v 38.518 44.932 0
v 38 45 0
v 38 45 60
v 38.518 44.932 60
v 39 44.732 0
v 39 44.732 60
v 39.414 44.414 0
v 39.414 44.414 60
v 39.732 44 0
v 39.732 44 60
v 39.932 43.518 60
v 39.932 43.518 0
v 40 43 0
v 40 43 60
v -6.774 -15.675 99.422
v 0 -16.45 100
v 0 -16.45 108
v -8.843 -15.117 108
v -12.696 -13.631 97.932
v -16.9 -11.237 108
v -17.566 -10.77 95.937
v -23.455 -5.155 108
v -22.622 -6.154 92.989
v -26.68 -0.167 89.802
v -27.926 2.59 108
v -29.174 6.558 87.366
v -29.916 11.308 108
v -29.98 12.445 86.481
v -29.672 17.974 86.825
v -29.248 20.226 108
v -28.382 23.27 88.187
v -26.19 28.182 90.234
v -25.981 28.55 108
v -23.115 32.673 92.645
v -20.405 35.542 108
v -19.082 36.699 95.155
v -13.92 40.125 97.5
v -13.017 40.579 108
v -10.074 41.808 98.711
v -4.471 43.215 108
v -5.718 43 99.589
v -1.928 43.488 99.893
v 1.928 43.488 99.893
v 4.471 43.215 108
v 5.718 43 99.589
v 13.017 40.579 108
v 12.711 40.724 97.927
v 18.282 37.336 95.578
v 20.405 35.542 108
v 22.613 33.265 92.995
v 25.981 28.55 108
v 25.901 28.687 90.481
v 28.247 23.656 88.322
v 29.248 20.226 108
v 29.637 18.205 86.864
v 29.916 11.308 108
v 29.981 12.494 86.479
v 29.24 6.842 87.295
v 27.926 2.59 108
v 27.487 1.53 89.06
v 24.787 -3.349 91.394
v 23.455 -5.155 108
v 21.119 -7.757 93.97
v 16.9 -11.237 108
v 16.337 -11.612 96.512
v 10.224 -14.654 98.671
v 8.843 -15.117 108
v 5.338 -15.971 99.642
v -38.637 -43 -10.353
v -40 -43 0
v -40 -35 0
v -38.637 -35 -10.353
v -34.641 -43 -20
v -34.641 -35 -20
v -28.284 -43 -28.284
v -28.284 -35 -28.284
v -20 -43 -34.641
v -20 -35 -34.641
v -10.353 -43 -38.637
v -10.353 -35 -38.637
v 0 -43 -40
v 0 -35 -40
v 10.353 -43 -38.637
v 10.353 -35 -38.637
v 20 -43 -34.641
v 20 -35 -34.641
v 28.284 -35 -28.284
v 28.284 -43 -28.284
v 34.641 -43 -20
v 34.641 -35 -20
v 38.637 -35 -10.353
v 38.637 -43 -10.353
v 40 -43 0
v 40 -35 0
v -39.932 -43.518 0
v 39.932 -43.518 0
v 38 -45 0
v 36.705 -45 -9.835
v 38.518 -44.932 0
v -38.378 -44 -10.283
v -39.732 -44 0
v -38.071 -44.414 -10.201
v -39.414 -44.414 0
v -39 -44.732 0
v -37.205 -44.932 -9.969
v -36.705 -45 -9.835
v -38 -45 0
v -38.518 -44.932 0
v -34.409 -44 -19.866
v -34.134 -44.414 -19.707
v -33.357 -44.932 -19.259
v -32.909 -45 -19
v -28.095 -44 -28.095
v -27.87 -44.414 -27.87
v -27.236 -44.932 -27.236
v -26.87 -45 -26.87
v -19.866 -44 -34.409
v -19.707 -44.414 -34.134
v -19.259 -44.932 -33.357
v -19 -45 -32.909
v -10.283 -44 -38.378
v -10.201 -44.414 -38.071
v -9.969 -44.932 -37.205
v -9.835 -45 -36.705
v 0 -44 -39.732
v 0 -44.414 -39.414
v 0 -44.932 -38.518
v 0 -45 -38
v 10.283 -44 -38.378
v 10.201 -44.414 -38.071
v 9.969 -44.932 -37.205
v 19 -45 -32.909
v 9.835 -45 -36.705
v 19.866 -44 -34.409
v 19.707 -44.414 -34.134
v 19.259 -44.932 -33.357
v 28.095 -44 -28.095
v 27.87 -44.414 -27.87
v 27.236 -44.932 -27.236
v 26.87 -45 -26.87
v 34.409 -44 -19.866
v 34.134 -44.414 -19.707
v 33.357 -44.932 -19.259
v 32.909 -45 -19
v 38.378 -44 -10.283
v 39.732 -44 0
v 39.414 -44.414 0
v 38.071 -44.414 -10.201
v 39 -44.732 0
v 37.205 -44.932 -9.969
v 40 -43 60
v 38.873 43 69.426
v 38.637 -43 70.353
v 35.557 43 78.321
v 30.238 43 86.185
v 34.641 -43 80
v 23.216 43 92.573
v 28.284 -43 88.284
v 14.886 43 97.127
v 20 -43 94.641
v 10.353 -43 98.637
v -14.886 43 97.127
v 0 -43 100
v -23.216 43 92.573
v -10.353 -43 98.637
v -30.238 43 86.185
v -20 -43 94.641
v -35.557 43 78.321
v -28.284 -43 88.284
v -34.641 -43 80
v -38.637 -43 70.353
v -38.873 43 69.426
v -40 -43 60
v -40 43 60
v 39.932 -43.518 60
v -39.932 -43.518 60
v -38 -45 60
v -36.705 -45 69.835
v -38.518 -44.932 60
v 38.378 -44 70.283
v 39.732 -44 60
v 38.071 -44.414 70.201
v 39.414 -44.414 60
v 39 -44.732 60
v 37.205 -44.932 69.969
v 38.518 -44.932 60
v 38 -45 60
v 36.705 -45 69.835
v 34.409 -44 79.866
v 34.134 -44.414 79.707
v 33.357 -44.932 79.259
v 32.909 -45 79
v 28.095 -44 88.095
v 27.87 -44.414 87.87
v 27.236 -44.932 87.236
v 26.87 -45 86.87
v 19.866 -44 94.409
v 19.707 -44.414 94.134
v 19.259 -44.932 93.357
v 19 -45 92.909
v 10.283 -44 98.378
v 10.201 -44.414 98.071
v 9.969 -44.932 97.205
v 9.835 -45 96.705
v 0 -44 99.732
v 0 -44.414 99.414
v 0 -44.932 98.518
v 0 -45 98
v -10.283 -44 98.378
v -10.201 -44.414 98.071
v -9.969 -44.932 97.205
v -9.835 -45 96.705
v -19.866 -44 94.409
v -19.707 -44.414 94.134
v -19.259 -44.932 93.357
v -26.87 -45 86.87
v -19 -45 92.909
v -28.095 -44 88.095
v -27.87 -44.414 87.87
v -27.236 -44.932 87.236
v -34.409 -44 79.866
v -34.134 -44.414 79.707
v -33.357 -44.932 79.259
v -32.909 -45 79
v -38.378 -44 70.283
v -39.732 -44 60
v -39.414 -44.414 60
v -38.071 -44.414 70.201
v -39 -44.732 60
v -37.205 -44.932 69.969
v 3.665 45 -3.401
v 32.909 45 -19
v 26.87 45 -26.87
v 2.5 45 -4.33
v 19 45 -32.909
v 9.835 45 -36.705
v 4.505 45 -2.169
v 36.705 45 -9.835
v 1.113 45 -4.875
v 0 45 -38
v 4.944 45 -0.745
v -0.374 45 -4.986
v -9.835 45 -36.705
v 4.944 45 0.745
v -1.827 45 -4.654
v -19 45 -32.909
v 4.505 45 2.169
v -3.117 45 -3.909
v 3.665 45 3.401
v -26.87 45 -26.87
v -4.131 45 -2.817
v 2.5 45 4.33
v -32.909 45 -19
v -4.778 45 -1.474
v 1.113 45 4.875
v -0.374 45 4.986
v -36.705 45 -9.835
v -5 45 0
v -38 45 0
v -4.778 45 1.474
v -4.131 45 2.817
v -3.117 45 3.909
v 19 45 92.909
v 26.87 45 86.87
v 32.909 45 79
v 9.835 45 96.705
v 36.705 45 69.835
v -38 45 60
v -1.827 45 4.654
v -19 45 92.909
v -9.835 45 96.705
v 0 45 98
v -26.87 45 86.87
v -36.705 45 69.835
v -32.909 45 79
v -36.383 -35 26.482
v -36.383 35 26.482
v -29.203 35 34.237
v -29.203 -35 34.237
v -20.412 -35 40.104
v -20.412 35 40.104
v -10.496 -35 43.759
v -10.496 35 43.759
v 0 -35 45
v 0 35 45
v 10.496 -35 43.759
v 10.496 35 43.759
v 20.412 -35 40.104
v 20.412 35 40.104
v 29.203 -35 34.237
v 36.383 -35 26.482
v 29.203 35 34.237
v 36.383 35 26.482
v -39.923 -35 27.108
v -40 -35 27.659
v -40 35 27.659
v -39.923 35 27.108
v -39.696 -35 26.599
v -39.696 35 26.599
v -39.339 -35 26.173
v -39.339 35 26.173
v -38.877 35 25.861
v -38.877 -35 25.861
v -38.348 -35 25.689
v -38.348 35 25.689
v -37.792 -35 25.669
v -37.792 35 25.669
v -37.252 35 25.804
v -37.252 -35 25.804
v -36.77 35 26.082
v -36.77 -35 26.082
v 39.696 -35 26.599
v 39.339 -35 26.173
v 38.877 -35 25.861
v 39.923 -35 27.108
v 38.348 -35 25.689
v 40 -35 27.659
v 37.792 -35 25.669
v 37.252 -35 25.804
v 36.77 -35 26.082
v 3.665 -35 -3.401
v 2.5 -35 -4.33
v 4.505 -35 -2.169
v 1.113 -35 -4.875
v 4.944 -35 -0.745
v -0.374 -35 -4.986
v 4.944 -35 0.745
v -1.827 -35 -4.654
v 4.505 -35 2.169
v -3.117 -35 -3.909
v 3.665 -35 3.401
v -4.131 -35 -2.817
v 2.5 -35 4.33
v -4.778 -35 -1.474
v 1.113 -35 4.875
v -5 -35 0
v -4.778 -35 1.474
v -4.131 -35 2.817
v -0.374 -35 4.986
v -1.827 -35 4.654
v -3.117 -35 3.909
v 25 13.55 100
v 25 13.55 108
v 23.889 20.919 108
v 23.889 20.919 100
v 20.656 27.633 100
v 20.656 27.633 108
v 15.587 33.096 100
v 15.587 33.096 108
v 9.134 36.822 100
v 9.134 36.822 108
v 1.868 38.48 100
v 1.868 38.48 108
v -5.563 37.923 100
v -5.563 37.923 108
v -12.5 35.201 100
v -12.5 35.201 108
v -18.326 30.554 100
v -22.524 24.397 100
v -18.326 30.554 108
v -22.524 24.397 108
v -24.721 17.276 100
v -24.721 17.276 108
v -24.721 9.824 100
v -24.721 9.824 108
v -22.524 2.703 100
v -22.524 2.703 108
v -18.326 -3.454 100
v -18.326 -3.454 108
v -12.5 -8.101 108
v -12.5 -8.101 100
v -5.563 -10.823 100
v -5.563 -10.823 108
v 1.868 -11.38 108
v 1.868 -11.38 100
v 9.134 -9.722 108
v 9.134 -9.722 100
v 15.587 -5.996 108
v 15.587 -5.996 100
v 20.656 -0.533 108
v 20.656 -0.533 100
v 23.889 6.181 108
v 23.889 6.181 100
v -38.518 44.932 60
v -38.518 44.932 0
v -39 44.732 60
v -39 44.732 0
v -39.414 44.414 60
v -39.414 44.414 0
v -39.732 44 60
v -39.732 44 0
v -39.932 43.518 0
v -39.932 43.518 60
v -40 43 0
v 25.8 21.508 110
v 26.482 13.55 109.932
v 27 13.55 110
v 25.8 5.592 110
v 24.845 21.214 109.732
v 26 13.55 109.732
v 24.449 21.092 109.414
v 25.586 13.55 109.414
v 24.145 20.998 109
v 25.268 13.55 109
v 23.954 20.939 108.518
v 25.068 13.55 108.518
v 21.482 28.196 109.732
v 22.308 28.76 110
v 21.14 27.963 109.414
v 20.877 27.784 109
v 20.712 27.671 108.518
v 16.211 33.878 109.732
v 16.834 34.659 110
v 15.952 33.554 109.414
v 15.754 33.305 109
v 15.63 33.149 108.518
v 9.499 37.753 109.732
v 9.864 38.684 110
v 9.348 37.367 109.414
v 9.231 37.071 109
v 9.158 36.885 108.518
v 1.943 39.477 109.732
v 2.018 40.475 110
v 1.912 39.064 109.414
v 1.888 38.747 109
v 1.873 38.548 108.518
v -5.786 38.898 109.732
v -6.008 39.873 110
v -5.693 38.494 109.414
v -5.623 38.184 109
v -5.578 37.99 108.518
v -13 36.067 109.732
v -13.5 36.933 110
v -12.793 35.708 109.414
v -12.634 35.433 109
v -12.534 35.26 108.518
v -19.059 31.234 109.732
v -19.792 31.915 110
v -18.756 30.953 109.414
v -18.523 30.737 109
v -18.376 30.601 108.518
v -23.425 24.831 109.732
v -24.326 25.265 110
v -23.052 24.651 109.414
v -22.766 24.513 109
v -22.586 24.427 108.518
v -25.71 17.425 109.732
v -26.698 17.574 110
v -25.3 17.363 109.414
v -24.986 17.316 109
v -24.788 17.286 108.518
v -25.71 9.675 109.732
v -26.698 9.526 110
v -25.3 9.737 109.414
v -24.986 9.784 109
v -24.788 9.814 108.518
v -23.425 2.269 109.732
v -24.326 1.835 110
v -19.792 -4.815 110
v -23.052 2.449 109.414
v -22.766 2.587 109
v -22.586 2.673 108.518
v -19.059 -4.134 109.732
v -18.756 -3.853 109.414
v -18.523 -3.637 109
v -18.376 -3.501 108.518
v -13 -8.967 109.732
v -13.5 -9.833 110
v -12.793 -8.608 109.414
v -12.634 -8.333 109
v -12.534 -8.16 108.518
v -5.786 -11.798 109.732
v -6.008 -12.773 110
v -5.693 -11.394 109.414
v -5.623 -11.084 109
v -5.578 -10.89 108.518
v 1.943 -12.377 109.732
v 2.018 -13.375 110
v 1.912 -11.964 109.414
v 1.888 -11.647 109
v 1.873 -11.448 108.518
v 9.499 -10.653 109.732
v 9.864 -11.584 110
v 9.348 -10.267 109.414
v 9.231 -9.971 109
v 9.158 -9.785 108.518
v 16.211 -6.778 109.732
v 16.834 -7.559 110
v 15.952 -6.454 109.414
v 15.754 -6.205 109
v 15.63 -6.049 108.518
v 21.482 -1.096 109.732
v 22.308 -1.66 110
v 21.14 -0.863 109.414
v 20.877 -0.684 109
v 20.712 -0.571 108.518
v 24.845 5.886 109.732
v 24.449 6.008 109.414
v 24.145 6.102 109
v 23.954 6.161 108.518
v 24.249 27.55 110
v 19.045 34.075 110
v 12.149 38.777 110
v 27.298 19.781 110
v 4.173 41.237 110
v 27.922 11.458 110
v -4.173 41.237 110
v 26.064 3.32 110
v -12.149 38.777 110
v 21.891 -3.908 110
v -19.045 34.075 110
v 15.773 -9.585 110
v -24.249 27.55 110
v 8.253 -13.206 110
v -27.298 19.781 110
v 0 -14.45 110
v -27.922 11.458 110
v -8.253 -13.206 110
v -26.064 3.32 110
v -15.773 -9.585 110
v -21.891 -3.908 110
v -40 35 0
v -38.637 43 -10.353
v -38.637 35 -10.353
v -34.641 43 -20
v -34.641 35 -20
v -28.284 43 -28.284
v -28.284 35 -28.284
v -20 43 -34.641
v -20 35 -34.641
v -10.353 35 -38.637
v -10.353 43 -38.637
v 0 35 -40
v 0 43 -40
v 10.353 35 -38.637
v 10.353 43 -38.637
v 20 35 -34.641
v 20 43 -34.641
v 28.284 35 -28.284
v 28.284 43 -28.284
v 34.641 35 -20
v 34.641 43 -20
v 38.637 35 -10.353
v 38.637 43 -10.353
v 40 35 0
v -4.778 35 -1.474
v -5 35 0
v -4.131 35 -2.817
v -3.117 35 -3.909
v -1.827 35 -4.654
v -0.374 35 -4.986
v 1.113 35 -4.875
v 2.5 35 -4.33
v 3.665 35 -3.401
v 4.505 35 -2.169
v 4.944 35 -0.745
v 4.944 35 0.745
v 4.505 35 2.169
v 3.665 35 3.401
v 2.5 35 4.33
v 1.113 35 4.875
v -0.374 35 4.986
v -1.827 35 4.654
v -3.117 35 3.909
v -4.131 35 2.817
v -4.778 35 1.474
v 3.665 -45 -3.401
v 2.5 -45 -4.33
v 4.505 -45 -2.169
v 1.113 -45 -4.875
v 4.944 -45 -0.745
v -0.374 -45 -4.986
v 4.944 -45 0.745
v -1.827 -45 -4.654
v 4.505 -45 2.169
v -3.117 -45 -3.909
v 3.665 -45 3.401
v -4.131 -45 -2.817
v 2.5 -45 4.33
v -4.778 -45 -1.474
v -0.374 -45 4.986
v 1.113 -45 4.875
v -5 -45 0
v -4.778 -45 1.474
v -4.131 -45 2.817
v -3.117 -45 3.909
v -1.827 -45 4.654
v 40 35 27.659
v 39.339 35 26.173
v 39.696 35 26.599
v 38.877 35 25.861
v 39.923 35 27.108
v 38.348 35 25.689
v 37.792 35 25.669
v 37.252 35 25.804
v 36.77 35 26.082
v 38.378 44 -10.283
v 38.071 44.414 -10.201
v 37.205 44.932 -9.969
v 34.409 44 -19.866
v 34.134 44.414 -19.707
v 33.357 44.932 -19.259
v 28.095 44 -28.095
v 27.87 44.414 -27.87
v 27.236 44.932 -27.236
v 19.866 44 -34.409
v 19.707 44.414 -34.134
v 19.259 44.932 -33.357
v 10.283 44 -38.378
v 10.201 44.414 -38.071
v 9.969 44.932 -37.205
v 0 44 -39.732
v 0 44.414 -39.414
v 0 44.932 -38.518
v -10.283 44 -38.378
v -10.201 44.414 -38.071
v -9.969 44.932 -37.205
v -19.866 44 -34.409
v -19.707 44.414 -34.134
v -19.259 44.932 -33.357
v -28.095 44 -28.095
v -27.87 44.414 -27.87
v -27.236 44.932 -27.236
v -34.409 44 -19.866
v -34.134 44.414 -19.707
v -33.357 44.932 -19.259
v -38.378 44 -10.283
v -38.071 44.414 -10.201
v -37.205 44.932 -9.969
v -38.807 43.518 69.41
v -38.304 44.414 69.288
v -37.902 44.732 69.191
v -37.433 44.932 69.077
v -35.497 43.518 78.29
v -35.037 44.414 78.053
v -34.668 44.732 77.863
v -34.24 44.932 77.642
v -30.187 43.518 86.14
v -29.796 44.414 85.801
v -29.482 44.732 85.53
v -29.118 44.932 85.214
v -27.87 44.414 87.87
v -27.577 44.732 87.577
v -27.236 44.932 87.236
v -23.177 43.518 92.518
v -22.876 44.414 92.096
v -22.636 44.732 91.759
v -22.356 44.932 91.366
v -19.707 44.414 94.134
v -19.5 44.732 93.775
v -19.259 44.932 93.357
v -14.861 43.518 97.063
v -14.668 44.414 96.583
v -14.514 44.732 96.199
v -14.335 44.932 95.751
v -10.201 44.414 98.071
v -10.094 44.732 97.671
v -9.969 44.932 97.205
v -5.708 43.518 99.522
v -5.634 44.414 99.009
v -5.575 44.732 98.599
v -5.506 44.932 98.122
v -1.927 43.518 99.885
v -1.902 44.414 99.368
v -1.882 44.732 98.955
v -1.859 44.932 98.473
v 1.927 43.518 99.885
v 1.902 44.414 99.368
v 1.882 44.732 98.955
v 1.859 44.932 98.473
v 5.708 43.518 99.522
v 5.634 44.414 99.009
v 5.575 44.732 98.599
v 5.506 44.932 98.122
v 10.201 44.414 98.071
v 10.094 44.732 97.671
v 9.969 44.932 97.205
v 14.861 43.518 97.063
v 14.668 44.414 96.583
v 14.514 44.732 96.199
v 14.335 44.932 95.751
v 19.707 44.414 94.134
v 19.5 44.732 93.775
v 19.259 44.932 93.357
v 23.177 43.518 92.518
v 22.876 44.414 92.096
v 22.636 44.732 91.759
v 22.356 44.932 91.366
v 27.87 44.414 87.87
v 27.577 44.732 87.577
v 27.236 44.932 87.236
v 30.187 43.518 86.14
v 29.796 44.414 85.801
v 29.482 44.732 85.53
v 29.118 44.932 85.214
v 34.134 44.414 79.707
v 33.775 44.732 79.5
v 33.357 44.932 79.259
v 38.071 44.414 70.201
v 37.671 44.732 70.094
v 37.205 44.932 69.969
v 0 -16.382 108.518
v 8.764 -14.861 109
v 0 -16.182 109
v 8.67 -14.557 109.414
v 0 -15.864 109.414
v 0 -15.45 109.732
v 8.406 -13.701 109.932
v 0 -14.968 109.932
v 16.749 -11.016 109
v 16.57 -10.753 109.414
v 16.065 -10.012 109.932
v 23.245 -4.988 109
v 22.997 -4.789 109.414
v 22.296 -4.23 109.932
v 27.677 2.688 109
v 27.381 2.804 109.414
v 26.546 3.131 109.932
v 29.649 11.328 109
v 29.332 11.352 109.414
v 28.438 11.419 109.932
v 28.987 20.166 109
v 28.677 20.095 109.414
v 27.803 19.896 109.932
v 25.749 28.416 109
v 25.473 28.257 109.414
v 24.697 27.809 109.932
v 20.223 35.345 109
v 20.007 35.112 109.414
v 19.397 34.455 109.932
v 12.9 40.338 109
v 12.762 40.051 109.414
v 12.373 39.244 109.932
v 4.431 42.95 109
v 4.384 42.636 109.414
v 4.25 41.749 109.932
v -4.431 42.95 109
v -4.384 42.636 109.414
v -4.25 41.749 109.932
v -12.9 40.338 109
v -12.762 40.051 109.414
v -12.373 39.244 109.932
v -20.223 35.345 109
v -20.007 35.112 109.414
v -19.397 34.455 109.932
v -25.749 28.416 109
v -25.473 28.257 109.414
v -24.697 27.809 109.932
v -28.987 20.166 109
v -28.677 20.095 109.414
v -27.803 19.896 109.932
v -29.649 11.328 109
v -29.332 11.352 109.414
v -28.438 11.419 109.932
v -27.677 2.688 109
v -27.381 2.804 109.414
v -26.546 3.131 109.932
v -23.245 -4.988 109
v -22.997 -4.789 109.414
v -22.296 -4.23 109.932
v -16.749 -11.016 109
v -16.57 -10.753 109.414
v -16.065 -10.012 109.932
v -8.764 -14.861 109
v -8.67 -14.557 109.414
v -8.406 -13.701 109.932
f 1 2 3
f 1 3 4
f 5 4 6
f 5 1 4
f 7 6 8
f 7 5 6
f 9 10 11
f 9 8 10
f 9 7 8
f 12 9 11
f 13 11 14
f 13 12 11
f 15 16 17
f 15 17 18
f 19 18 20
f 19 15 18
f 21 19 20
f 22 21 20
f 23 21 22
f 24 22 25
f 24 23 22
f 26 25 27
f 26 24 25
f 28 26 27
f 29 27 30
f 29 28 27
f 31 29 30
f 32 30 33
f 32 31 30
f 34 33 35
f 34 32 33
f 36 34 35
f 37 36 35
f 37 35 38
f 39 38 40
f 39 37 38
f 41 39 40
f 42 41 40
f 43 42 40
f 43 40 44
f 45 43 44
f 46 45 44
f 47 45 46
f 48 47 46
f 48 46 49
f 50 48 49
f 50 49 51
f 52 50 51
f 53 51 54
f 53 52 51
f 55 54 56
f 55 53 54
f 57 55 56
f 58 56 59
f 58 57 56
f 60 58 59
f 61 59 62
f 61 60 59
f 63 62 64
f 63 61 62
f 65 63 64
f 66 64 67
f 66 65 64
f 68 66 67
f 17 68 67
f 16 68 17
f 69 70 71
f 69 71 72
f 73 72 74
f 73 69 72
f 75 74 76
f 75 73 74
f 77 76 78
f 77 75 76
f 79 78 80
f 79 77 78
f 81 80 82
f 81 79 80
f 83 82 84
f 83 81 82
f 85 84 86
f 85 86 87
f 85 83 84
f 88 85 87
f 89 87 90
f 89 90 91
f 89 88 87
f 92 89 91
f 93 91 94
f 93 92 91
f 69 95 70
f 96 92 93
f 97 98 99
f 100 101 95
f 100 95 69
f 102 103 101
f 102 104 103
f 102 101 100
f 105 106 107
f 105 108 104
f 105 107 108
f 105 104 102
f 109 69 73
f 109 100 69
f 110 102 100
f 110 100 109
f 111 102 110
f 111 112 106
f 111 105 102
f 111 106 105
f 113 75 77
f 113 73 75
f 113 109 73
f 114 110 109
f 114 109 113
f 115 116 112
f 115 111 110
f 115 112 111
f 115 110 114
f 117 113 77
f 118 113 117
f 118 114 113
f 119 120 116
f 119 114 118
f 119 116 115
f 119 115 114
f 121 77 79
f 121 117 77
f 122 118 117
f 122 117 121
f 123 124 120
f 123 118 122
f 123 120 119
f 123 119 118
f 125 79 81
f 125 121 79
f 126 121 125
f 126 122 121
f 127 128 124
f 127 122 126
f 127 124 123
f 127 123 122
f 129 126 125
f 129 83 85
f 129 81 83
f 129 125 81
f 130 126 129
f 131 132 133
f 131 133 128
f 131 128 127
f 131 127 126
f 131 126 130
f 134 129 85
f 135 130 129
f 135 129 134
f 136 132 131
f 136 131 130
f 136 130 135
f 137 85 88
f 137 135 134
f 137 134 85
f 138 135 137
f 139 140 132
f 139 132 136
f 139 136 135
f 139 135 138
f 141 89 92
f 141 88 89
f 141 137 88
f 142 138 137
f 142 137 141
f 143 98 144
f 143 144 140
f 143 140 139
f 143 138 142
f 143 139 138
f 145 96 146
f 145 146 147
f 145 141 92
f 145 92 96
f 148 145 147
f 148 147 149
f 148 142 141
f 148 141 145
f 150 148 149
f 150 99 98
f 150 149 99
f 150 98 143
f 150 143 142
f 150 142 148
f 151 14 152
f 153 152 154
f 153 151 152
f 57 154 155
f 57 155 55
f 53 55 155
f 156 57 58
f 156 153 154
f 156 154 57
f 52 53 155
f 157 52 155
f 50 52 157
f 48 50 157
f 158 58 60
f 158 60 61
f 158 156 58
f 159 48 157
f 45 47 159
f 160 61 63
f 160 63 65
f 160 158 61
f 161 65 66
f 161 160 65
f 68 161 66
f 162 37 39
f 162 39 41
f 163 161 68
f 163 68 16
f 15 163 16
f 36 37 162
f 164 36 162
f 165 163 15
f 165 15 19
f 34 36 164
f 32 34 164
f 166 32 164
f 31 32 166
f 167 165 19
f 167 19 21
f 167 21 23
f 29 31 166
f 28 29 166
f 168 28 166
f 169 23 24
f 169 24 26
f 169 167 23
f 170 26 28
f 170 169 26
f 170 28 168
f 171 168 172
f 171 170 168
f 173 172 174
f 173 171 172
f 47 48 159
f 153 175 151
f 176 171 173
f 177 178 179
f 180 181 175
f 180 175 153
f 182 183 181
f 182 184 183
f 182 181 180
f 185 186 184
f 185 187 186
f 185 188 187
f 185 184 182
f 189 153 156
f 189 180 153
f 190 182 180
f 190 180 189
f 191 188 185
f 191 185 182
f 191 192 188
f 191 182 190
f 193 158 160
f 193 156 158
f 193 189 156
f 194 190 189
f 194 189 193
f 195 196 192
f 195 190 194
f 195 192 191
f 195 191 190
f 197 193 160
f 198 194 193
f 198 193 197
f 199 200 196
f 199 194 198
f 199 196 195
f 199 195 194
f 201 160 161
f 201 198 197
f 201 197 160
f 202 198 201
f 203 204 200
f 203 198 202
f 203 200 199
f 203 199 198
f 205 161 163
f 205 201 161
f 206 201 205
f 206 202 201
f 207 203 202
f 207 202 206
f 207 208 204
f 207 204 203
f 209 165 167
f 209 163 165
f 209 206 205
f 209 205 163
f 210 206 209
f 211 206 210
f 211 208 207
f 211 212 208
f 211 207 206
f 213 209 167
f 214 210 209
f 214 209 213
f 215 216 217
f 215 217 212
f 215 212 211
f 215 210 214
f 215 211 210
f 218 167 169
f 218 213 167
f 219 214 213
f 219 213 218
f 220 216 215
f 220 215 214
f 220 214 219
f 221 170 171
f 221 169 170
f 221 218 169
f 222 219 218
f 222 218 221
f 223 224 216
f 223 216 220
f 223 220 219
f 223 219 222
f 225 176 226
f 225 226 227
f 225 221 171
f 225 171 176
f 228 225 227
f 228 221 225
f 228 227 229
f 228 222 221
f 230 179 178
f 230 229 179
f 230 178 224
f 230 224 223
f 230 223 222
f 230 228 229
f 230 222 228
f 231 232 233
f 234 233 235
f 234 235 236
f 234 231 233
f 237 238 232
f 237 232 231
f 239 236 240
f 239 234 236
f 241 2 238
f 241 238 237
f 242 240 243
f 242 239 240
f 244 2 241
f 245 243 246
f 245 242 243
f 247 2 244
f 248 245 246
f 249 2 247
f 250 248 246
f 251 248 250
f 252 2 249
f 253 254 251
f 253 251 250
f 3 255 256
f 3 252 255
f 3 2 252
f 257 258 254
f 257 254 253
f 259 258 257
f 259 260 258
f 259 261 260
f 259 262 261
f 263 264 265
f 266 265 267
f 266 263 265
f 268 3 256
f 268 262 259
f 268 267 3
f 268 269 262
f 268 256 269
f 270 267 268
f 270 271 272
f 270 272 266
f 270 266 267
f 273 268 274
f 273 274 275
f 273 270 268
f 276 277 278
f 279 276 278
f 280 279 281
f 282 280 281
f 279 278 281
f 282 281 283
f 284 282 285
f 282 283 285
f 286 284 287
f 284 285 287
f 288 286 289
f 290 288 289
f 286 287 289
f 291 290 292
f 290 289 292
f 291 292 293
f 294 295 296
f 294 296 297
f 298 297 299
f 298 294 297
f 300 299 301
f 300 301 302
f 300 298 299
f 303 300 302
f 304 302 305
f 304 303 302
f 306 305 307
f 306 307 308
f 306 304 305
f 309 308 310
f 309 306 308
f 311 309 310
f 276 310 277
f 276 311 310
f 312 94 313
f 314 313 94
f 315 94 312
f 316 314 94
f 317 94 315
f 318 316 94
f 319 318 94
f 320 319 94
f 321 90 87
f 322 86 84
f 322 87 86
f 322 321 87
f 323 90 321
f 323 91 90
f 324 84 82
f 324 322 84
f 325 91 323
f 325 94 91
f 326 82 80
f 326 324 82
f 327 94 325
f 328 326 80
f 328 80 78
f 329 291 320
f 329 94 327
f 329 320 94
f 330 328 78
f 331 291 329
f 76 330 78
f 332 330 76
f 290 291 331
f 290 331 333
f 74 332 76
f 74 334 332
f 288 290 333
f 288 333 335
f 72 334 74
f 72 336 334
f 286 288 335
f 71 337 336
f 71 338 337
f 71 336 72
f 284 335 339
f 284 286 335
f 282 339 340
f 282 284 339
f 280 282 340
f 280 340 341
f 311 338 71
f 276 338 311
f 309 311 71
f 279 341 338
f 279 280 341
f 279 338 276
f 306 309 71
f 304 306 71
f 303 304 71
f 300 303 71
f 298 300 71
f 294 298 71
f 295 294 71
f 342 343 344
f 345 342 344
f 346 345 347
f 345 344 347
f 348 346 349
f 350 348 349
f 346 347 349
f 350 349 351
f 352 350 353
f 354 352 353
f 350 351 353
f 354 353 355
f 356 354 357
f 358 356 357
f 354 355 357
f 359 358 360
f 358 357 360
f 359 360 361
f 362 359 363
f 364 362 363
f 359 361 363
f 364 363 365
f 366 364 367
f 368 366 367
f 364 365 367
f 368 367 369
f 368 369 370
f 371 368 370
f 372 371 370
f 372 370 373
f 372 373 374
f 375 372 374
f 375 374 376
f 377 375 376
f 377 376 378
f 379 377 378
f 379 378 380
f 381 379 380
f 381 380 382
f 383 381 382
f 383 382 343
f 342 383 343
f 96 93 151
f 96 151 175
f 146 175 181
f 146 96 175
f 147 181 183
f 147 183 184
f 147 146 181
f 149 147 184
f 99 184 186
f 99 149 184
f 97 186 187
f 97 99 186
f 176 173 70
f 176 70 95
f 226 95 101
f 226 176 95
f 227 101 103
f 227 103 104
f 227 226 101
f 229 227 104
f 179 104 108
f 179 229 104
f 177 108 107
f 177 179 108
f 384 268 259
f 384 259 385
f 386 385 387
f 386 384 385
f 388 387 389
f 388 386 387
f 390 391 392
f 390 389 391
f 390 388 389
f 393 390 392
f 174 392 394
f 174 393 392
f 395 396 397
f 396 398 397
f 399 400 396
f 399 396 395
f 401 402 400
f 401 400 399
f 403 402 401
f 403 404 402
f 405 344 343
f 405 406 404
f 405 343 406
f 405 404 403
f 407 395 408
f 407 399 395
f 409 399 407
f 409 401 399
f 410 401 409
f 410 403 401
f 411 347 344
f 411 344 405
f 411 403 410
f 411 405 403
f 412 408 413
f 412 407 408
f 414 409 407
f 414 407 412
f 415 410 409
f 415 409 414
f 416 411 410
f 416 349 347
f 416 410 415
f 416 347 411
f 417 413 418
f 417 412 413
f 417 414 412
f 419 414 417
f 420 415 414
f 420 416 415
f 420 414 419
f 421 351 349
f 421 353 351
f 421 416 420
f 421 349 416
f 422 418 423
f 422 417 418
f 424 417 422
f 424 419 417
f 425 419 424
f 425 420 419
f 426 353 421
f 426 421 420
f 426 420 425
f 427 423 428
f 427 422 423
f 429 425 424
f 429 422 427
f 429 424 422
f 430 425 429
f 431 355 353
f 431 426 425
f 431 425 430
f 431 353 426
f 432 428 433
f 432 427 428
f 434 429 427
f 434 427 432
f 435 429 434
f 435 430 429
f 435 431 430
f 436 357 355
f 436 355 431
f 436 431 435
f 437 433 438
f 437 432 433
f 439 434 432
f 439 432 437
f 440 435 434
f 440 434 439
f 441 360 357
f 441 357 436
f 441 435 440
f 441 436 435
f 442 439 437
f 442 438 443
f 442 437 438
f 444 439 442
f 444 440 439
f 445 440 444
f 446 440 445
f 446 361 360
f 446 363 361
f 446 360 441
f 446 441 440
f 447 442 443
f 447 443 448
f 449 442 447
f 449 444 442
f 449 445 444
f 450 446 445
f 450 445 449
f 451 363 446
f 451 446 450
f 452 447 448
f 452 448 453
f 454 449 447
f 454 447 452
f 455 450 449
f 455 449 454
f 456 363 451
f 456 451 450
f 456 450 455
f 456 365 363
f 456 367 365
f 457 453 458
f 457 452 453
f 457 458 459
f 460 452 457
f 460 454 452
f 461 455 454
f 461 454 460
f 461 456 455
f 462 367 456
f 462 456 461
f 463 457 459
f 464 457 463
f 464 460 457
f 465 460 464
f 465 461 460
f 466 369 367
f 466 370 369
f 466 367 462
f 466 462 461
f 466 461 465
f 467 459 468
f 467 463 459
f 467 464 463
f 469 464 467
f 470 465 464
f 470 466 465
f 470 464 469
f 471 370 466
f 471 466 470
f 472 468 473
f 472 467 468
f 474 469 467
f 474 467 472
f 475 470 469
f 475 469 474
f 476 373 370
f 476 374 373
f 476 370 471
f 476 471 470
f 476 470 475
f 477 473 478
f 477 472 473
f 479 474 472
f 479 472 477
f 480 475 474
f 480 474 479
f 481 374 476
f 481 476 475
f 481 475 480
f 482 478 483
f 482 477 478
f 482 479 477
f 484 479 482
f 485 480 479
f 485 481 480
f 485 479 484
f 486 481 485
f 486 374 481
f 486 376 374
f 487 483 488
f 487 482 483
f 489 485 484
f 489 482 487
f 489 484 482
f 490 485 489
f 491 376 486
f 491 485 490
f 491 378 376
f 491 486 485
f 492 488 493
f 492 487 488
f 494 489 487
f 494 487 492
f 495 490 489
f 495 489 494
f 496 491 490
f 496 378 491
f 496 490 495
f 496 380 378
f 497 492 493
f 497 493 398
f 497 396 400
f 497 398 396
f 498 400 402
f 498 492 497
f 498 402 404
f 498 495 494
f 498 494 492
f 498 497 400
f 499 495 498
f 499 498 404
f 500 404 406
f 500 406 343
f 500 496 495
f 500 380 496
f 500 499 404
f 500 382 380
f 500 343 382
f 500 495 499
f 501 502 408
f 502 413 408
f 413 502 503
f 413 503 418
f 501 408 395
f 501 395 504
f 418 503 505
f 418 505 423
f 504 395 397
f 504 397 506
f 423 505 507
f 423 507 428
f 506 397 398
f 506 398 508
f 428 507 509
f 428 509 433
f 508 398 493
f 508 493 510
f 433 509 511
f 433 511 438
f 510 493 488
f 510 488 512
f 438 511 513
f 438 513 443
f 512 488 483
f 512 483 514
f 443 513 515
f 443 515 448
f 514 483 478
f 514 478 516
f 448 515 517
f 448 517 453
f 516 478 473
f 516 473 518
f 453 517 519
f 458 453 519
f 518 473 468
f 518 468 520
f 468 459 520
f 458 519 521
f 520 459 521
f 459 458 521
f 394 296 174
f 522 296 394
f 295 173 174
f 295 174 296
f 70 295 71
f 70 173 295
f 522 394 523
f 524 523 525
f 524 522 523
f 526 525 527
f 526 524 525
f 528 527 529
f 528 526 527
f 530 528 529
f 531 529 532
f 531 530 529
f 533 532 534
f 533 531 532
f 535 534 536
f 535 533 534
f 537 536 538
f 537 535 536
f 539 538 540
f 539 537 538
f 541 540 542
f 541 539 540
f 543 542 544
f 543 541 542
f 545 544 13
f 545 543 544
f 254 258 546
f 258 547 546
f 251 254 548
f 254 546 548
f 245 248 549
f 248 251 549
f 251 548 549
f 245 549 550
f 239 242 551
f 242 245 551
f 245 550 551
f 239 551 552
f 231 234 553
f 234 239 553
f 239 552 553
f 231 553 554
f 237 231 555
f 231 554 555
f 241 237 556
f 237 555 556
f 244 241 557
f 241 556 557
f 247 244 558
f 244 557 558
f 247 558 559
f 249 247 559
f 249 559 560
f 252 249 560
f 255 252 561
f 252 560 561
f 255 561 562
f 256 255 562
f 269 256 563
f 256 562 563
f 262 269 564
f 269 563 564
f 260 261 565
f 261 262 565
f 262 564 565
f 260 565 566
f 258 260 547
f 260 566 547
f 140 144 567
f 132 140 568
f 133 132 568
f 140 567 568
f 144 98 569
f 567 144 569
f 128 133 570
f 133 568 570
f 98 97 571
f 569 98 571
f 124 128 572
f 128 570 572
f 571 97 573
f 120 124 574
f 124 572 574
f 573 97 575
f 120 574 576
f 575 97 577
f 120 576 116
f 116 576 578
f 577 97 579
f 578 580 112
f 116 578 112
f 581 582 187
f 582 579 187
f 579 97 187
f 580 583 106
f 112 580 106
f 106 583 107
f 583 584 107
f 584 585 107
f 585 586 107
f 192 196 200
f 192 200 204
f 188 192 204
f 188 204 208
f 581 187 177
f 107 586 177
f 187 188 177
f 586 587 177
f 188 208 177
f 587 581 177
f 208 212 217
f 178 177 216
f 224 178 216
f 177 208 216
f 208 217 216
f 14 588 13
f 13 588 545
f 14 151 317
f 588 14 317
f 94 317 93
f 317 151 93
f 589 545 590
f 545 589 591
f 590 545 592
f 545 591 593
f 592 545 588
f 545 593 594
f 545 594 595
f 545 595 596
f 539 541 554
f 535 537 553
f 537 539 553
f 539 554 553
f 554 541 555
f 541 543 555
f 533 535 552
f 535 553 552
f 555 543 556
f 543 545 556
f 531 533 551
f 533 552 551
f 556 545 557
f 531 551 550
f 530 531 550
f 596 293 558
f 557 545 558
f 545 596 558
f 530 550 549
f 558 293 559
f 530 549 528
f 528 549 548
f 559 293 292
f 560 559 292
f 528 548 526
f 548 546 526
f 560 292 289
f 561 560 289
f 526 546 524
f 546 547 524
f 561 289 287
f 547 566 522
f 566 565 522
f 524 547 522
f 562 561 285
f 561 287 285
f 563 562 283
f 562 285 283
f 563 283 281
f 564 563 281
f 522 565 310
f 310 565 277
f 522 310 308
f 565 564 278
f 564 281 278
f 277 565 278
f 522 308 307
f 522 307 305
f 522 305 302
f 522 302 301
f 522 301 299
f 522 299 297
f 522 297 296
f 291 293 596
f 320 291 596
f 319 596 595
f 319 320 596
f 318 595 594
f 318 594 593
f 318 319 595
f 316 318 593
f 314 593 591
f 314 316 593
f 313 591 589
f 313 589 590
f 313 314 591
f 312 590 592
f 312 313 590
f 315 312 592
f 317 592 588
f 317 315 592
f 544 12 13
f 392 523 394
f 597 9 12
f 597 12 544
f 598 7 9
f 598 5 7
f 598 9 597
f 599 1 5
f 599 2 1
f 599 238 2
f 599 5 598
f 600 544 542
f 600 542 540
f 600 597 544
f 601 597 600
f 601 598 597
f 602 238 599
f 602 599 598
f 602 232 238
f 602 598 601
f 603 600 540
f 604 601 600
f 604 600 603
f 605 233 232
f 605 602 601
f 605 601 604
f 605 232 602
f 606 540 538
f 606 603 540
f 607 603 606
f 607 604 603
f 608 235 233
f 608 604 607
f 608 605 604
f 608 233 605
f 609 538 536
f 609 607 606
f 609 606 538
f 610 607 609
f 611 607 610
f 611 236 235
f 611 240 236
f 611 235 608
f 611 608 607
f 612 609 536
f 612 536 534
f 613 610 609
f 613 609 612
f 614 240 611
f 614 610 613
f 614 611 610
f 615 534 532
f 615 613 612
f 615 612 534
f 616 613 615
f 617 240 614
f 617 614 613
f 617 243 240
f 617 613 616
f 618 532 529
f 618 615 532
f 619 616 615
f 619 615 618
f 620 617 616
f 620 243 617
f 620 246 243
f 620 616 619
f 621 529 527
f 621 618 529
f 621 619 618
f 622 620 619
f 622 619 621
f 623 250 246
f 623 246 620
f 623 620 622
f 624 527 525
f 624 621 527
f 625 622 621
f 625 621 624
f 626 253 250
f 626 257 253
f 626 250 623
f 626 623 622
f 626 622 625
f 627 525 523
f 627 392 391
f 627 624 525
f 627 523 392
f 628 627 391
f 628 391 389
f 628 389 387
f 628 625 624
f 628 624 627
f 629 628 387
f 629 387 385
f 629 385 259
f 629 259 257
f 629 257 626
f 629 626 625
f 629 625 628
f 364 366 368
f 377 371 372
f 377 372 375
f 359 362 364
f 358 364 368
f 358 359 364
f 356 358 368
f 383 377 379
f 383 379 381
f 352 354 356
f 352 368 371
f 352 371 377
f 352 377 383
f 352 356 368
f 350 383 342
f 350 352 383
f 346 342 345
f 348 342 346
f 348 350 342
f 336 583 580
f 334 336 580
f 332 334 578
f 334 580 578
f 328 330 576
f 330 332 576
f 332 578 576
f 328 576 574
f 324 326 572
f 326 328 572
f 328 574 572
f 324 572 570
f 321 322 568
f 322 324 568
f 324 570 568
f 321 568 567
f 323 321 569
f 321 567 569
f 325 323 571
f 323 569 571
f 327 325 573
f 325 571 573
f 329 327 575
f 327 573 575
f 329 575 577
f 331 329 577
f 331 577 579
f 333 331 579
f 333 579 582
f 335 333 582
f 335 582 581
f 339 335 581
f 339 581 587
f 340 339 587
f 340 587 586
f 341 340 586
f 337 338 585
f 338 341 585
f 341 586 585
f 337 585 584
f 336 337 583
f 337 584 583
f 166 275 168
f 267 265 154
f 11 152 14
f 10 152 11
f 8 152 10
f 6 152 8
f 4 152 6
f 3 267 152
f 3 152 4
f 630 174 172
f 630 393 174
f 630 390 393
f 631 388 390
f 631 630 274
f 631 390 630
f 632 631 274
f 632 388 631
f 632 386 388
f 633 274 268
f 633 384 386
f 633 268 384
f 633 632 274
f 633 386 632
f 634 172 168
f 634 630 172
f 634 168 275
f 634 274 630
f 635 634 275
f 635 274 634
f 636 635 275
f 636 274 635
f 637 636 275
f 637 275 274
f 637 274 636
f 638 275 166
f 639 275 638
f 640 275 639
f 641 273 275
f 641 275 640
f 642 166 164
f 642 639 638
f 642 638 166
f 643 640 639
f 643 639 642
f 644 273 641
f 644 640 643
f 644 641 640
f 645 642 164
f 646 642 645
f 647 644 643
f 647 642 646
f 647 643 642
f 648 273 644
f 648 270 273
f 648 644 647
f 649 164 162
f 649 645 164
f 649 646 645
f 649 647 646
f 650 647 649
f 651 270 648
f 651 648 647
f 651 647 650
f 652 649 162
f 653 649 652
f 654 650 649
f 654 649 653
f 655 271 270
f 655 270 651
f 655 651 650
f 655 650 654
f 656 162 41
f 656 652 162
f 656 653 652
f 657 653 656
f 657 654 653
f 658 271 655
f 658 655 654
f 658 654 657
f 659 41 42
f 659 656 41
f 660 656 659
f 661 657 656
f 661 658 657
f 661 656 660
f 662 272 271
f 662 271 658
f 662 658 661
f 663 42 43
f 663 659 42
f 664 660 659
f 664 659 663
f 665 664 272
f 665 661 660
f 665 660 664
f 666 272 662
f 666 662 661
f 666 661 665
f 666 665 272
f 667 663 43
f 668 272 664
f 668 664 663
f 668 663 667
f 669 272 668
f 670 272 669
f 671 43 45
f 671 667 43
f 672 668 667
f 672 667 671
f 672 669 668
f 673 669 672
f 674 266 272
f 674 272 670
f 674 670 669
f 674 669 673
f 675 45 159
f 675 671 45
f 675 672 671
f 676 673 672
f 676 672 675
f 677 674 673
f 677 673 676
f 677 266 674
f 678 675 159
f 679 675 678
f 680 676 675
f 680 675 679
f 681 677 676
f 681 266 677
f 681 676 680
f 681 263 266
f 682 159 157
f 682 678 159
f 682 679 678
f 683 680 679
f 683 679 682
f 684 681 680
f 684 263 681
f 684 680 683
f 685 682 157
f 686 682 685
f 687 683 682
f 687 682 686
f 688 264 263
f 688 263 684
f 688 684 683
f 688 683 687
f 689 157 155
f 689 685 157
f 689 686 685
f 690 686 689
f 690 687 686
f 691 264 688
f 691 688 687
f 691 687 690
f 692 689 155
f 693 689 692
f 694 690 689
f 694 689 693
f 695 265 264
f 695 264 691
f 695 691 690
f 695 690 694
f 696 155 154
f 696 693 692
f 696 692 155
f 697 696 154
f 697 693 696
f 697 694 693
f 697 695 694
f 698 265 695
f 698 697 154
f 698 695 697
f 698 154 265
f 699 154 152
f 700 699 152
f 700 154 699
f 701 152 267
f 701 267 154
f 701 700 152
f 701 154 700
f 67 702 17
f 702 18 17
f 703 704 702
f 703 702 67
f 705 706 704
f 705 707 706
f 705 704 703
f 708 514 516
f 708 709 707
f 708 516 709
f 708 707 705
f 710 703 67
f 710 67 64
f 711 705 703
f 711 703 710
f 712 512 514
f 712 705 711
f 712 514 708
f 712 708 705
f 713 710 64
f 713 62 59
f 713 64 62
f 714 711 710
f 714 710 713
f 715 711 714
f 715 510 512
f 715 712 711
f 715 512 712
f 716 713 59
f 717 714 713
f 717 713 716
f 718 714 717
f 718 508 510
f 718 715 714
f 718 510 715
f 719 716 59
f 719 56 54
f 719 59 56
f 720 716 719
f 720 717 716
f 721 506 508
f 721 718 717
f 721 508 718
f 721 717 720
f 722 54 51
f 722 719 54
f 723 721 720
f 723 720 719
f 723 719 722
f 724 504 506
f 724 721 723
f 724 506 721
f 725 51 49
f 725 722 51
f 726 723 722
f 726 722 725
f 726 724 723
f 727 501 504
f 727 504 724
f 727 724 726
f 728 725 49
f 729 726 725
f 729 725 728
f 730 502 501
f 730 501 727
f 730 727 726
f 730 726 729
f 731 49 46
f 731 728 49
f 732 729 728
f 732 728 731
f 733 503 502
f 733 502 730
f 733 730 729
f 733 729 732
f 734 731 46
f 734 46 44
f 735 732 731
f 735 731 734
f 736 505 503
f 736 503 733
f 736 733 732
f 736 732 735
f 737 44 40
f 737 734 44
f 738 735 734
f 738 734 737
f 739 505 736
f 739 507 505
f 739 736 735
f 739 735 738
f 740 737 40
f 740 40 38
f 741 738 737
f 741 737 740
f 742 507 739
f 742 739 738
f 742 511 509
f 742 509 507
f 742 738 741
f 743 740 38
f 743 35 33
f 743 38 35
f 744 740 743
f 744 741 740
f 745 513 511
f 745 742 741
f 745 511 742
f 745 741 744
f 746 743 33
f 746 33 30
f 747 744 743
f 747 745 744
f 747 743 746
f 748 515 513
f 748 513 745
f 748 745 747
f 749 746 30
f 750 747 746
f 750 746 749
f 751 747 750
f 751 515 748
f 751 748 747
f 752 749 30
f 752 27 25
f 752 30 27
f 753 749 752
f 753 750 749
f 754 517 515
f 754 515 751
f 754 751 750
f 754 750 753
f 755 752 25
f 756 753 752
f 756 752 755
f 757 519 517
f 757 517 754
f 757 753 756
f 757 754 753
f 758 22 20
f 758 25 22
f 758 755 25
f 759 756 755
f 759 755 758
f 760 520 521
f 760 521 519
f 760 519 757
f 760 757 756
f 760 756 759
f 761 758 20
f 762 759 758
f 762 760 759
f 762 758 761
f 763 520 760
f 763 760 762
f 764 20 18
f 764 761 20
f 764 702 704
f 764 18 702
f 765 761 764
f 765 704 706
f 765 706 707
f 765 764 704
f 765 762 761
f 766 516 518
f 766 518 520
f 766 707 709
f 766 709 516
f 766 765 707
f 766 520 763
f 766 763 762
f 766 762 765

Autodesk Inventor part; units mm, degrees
ref_plane "YZ Plane" through (0, 0, 0) normal (1, 0, 0) x (0, 1, 0)
ref_plane "XZ Plane" through (0, 0, 0) normal (0, 1, 0) x (-1, 0, 0)
sketch "Sketch1" plane through (0, 0, 0) normal (0, 1, 0) x (-1, 0, 0)
  arc A0 (26.4575, 30) -> (-26.4575, 30) centre (0, 0) ccw construction
  arc A1 (40, 60) -> (-40, 60) centre (0, 60) ccw
  line L0 (0, 100) -> (0, 0) construction
  line L1 (40, 60) -> (40, 0)
  line L2 (-40, 60) -> (-40, 0)
  arc A2 (26.4575, 30) -> (40, 60) centre (0, 60) ccw construction
  arc A3 (40, 0) -> (26.4575, 30) centre (0, 0) ccw construction
  arc A4 (-40, 60) -> (26.4575, 30) centre (0, 60) ccw construction
  arc A5 (-26.4575, 30) -> (-40, 0) centre (0, 0) ccw construction
  arc A6 (-40, 0) -> (40, 0) centre (0, 0) ccw
  circle A7 centre (0, 0) radius 5
  dimension "d0" = 80
  dimension "d1" = 80
  dimension "d2" = 100
  dimension "d3" = 10
extrude "Extrusion1" add sketch "Sketch1" along normal mid plane 90
sketch "Sketch2" plane through (0, 0, 0) normal (0, 1, 0) x (-1, 0, 0)
  circle A0 centre (0, 0) radius 5 projected
  circle A1 centre (0, 0) radius 45
  dimension "d6" = 90
extrude "Extrusion2" cut sketch "Sketch2" along normal mid plane 70
fillet "Fillet1" radius 2 10 edges at (40, 0, 20.6155) (-40, 0, 20.6155) (0, 45, -40) (-40, 45, 30) (0, 45, 100) (40, 45, 30) (0, -45, 100) (-40, -45, 30) (0, -45, -40) (40, -45, 30)
ref_plane "Work Plane1" through (40, 0, 60) normal (0, 0, -1) x (0, -1, 0)
sketch "Sketch3" plane through (40, 0, 60) normal (0, 0, -1) x (0, -1, 0)
  circle A0 centre (-13.55, 40) radius 30
  line L0 (0, 40) -> (-13.55, 40)
  dimension "d10" = 60
  dimension "d11" = 13.55
extrude "Extrusion3" add sketch "Sketch3" against normal blind 50
sketch "Sketch4" plane through (0, 13.55, 110) normal (0, 0, 1) x (1, 0, 0)
  circle A0 centre (0, 0) radius 30 projected
  circle A1 centre (0, 0) radius 25
  point P0 (0, -13.55)
  dimension "d14" = 50
extrude "Extrusion4" cut sketch "Sketch4" against normal blind 10 contours A1
fillet "Fillet2" radius 2 2 edges at (0, 43.55, 110) (-25, 13.55, 110)
properties part number "Wirst2"
